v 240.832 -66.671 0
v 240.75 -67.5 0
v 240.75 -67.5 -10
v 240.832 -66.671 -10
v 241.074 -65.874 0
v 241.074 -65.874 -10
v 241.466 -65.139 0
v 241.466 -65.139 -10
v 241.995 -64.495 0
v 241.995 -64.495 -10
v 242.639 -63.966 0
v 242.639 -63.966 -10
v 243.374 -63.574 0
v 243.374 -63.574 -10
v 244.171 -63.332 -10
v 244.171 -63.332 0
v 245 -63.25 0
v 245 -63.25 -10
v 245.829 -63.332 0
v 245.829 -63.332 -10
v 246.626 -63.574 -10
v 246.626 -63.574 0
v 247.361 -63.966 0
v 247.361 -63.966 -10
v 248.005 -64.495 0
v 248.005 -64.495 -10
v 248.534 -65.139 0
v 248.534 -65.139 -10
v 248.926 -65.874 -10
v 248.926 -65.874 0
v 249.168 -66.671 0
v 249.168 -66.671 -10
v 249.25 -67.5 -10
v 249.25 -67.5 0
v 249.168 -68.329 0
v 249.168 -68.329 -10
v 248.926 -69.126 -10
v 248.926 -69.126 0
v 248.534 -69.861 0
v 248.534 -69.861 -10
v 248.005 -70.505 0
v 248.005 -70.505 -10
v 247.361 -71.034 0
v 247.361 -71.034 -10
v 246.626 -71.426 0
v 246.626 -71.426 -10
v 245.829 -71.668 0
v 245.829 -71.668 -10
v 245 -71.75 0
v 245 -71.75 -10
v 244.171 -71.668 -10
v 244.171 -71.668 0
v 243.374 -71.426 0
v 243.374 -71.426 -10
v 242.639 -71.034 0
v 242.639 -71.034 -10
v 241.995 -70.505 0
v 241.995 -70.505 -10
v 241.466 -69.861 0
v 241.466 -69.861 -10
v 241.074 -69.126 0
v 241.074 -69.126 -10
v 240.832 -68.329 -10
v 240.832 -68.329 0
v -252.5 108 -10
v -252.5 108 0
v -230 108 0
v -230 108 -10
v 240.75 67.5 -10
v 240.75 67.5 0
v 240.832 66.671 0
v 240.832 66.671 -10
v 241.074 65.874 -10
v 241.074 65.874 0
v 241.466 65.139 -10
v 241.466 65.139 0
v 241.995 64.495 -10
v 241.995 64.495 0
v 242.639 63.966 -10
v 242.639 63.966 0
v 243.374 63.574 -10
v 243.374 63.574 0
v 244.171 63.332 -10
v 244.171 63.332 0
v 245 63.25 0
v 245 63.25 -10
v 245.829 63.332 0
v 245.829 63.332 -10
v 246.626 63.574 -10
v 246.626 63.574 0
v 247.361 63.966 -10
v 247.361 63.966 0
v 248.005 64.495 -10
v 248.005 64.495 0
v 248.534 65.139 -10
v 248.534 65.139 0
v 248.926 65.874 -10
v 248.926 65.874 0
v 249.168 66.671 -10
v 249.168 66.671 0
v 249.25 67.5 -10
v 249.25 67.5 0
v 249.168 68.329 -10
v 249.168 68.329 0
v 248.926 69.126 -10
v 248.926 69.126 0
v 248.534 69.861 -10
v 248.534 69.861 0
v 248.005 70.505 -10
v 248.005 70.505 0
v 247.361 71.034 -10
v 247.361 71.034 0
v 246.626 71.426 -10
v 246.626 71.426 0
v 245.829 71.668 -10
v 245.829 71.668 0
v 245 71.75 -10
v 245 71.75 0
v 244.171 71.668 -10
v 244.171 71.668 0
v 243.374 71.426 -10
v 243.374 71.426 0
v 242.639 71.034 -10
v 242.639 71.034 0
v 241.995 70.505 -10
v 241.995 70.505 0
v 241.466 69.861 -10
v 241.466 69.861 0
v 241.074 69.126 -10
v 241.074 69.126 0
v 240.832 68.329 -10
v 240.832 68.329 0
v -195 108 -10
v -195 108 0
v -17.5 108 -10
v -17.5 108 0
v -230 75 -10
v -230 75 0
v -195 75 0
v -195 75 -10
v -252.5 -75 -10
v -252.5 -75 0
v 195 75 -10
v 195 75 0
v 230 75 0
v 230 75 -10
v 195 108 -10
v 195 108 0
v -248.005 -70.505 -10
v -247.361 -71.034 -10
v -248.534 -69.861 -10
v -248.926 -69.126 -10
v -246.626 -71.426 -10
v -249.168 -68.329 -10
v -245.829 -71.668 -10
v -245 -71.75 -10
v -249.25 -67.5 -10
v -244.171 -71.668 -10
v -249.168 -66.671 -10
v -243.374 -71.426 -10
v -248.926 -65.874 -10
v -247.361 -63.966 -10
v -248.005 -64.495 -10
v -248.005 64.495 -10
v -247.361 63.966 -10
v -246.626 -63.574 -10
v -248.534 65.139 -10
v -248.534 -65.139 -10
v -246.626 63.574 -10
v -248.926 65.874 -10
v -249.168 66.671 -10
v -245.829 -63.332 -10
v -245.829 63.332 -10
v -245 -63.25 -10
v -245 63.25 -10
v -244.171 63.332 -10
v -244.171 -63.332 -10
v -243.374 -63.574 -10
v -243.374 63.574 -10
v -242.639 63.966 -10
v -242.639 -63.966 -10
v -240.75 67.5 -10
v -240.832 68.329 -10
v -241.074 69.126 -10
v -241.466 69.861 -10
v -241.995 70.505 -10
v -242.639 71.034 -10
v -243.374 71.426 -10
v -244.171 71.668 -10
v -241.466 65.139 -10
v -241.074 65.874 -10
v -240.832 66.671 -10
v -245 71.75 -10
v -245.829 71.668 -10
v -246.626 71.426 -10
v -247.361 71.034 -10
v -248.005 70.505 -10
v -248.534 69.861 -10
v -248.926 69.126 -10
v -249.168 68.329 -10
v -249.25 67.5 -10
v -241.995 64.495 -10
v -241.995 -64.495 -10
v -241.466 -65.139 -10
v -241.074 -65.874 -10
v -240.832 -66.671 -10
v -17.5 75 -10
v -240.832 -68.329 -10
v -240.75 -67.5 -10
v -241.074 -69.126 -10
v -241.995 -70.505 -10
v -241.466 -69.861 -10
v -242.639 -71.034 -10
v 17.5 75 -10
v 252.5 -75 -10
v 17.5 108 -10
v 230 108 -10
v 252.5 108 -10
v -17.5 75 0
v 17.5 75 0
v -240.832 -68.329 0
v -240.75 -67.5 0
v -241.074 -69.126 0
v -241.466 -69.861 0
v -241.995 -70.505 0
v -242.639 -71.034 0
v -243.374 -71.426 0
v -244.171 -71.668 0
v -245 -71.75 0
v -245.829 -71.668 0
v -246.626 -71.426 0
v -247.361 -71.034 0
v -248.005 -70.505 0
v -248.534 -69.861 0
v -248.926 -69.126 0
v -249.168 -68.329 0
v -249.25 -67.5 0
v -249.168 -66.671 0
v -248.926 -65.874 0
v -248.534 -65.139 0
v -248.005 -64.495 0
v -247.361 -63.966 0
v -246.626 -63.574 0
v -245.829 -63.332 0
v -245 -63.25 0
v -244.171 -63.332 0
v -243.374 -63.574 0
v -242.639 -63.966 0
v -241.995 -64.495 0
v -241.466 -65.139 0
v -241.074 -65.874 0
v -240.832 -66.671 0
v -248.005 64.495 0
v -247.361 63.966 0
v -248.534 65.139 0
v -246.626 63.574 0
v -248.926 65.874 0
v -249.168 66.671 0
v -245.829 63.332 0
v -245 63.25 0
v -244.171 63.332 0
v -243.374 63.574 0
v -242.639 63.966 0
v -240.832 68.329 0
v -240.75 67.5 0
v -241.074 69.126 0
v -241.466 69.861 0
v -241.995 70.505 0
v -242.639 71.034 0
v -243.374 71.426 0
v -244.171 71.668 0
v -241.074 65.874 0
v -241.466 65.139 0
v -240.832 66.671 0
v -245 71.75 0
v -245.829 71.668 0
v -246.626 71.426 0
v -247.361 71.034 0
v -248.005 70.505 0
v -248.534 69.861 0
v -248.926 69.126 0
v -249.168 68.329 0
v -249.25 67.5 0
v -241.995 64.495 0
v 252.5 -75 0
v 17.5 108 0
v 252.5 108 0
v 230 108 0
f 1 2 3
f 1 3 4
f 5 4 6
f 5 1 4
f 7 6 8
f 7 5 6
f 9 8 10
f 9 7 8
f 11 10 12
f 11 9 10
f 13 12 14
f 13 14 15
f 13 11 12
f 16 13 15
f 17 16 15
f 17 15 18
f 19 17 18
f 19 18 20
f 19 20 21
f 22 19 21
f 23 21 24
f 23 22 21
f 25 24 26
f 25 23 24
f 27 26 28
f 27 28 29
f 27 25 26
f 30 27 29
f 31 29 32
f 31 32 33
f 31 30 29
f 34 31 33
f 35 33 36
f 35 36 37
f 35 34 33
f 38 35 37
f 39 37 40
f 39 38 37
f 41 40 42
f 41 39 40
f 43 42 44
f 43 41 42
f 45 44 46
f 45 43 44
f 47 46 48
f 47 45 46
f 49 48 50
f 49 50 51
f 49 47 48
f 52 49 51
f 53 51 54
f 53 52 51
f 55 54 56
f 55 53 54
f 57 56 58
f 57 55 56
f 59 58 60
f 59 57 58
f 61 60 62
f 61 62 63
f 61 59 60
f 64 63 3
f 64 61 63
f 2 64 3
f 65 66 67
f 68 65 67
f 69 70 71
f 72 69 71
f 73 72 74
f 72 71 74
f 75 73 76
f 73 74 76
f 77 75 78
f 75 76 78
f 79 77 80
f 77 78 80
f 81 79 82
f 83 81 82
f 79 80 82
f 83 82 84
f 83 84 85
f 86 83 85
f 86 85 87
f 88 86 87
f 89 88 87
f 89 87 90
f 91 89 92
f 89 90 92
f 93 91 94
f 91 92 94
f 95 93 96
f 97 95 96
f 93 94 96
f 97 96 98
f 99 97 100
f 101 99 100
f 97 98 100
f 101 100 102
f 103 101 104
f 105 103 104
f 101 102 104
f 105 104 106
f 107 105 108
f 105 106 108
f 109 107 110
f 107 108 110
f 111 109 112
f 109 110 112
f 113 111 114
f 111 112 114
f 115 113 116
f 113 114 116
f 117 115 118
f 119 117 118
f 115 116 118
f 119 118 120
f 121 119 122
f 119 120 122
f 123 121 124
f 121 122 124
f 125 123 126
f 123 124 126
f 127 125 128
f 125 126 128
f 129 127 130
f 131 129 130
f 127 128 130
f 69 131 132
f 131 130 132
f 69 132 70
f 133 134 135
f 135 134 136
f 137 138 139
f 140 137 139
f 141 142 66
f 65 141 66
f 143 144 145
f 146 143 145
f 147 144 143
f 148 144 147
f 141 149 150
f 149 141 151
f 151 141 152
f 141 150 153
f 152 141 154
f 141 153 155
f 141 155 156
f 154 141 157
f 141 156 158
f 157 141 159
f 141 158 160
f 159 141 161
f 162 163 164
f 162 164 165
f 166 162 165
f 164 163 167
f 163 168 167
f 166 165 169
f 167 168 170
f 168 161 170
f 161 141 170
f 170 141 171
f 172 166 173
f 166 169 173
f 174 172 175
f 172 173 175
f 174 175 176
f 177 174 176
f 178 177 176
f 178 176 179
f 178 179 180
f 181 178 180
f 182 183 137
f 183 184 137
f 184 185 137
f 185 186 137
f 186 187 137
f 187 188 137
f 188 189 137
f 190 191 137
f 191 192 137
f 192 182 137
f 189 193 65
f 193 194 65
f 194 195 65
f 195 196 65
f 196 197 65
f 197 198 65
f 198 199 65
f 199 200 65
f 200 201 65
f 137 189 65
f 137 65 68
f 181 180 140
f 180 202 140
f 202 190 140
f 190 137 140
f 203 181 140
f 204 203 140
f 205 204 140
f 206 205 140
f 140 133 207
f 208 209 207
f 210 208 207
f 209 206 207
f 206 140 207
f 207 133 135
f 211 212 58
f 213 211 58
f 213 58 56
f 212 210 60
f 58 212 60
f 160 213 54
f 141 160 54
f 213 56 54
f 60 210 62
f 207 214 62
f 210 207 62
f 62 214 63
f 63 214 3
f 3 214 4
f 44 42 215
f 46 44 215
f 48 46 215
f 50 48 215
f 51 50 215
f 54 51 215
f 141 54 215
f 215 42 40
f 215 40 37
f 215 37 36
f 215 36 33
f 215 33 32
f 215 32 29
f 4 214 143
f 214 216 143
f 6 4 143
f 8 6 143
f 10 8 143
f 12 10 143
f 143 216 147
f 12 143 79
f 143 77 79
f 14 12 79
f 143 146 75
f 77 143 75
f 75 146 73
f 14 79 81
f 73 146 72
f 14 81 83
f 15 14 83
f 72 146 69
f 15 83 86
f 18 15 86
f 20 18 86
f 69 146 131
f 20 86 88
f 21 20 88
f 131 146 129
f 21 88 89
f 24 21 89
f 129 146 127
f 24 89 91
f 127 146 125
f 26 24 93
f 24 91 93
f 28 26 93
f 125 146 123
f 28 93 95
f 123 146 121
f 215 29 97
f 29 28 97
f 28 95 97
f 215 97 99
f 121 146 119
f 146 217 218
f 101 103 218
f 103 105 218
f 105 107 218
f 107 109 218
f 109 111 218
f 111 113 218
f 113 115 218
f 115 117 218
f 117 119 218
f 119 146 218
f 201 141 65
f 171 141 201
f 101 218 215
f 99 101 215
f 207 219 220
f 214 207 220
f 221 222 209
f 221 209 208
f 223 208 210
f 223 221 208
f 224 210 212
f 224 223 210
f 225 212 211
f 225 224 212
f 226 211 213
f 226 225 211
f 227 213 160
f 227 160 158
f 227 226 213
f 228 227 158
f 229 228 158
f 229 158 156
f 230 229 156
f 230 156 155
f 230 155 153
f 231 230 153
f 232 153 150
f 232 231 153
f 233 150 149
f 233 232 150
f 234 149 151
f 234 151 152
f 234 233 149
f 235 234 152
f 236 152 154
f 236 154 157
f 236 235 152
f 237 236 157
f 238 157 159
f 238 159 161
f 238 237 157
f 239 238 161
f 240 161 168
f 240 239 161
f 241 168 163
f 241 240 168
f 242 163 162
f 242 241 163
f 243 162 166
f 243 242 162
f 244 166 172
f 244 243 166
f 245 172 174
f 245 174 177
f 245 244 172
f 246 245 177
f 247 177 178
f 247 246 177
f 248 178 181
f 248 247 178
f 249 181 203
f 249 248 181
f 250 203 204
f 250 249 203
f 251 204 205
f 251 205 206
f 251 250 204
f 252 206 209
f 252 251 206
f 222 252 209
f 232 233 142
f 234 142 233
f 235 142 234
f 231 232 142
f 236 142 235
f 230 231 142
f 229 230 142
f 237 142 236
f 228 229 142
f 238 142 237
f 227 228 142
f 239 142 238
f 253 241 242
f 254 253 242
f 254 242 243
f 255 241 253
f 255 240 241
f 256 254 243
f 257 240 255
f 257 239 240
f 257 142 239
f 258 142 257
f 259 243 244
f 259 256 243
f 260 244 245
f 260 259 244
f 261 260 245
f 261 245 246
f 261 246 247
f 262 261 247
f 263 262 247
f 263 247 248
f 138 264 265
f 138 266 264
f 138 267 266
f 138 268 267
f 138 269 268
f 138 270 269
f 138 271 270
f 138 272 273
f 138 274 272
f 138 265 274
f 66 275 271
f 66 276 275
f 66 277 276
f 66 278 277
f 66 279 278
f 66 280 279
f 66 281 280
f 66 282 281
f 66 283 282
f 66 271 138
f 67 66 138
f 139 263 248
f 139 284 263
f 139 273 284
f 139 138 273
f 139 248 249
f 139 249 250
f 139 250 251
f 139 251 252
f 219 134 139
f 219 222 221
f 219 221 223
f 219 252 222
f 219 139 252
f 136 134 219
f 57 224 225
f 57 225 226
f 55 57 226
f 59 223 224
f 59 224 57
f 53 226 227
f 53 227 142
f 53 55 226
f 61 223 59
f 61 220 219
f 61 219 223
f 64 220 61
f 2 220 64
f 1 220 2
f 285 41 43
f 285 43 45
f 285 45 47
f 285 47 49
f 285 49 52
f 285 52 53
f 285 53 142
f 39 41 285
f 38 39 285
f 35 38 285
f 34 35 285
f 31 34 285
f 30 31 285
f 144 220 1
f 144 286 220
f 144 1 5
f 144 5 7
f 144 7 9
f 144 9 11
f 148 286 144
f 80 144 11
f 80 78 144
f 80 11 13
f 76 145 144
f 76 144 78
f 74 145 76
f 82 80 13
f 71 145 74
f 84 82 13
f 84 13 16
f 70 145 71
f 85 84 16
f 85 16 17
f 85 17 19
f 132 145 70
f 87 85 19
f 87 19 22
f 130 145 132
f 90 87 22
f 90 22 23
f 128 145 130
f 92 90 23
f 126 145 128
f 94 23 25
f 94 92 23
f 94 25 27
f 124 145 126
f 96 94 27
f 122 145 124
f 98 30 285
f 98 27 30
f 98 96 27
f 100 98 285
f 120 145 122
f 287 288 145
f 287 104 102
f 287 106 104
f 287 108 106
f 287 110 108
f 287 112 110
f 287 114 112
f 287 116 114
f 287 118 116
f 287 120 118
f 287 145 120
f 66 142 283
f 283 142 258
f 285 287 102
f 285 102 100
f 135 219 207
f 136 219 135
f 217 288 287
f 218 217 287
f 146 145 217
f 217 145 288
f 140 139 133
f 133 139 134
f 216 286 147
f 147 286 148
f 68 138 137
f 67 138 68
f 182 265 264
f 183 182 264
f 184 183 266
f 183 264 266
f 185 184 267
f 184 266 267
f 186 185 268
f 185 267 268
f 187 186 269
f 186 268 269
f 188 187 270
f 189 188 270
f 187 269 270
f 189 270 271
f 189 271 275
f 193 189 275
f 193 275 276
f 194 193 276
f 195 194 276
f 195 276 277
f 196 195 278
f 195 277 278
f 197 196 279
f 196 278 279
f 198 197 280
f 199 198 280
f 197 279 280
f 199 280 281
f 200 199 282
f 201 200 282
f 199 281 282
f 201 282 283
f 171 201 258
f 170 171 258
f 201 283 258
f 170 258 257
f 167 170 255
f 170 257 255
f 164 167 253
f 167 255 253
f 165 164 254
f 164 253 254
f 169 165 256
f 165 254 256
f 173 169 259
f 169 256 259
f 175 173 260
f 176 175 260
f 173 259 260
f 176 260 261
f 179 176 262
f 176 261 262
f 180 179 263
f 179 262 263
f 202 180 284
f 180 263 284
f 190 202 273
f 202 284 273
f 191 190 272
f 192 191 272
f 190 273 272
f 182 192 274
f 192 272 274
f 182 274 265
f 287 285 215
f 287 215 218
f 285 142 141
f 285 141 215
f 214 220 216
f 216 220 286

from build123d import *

# Parameters (mm, degrees)
IZIM1_W               = 505
IZIM1_H               = 150
TABAN_FLAN_1_DEPTH    = 10
IZIM2_R               = 4.25
KES_EKSTR_ZYON1_DEPTH = 10
IZIM3_W               = 22.5
IZIM3_H               = 33
IZIM3_W_2             = 177.5
SEKME1_DEPTH          = 10


# Sheet-metal steps are written as plain solids
with BuildPart() as part:
    # Çizim1 → Taban-Flanş1 (new body)
    with BuildSketch(Plane.XY):
        Rectangle(IZIM1_W, IZIM1_H)
    extrude(amount=-TABAN_FLAN_1_DEPTH)

    # Çizim2 → Kes-Ekstrüzyon1 (cut)
    with BuildSketch(Plane.XY):
        with Locations((-245, 67.5)):
            Circle(IZIM2_R)
        with Locations(Location((245, 67.5, 0), (0, 0, 180))):
            Circle(IZIM2_R)
    kes_ekstr_zyon1 = extrude(amount=-KES_EKSTR_ZYON1_DEPTH, mode=Mode.SUBTRACT)

    # Aynalama1: Kes-Ekstrüzyon1 across plane
    add(kes_ekstr_zyon1.mirror(Plane.ZX), mode=Mode.SUBTRACT)

    # Çizim3 → Sekme1 (add)
    with BuildSketch(Plane.XY):
        with Locations((241.25, 91.5)):
            Rectangle(IZIM3_W, IZIM3_H)
        with Locations((106.25, 91.5)):
            Rectangle(IZIM3_W_2, IZIM3_H)
        with Locations((-106.25, 91.5)):
            Rectangle(IZIM3_W_2, IZIM3_H)
        with Locations((-241.25, 91.5)):
            Rectangle(IZIM3_W, IZIM3_H)
    extrude(amount=-SEKME1_DEPTH)


solid = part.part
